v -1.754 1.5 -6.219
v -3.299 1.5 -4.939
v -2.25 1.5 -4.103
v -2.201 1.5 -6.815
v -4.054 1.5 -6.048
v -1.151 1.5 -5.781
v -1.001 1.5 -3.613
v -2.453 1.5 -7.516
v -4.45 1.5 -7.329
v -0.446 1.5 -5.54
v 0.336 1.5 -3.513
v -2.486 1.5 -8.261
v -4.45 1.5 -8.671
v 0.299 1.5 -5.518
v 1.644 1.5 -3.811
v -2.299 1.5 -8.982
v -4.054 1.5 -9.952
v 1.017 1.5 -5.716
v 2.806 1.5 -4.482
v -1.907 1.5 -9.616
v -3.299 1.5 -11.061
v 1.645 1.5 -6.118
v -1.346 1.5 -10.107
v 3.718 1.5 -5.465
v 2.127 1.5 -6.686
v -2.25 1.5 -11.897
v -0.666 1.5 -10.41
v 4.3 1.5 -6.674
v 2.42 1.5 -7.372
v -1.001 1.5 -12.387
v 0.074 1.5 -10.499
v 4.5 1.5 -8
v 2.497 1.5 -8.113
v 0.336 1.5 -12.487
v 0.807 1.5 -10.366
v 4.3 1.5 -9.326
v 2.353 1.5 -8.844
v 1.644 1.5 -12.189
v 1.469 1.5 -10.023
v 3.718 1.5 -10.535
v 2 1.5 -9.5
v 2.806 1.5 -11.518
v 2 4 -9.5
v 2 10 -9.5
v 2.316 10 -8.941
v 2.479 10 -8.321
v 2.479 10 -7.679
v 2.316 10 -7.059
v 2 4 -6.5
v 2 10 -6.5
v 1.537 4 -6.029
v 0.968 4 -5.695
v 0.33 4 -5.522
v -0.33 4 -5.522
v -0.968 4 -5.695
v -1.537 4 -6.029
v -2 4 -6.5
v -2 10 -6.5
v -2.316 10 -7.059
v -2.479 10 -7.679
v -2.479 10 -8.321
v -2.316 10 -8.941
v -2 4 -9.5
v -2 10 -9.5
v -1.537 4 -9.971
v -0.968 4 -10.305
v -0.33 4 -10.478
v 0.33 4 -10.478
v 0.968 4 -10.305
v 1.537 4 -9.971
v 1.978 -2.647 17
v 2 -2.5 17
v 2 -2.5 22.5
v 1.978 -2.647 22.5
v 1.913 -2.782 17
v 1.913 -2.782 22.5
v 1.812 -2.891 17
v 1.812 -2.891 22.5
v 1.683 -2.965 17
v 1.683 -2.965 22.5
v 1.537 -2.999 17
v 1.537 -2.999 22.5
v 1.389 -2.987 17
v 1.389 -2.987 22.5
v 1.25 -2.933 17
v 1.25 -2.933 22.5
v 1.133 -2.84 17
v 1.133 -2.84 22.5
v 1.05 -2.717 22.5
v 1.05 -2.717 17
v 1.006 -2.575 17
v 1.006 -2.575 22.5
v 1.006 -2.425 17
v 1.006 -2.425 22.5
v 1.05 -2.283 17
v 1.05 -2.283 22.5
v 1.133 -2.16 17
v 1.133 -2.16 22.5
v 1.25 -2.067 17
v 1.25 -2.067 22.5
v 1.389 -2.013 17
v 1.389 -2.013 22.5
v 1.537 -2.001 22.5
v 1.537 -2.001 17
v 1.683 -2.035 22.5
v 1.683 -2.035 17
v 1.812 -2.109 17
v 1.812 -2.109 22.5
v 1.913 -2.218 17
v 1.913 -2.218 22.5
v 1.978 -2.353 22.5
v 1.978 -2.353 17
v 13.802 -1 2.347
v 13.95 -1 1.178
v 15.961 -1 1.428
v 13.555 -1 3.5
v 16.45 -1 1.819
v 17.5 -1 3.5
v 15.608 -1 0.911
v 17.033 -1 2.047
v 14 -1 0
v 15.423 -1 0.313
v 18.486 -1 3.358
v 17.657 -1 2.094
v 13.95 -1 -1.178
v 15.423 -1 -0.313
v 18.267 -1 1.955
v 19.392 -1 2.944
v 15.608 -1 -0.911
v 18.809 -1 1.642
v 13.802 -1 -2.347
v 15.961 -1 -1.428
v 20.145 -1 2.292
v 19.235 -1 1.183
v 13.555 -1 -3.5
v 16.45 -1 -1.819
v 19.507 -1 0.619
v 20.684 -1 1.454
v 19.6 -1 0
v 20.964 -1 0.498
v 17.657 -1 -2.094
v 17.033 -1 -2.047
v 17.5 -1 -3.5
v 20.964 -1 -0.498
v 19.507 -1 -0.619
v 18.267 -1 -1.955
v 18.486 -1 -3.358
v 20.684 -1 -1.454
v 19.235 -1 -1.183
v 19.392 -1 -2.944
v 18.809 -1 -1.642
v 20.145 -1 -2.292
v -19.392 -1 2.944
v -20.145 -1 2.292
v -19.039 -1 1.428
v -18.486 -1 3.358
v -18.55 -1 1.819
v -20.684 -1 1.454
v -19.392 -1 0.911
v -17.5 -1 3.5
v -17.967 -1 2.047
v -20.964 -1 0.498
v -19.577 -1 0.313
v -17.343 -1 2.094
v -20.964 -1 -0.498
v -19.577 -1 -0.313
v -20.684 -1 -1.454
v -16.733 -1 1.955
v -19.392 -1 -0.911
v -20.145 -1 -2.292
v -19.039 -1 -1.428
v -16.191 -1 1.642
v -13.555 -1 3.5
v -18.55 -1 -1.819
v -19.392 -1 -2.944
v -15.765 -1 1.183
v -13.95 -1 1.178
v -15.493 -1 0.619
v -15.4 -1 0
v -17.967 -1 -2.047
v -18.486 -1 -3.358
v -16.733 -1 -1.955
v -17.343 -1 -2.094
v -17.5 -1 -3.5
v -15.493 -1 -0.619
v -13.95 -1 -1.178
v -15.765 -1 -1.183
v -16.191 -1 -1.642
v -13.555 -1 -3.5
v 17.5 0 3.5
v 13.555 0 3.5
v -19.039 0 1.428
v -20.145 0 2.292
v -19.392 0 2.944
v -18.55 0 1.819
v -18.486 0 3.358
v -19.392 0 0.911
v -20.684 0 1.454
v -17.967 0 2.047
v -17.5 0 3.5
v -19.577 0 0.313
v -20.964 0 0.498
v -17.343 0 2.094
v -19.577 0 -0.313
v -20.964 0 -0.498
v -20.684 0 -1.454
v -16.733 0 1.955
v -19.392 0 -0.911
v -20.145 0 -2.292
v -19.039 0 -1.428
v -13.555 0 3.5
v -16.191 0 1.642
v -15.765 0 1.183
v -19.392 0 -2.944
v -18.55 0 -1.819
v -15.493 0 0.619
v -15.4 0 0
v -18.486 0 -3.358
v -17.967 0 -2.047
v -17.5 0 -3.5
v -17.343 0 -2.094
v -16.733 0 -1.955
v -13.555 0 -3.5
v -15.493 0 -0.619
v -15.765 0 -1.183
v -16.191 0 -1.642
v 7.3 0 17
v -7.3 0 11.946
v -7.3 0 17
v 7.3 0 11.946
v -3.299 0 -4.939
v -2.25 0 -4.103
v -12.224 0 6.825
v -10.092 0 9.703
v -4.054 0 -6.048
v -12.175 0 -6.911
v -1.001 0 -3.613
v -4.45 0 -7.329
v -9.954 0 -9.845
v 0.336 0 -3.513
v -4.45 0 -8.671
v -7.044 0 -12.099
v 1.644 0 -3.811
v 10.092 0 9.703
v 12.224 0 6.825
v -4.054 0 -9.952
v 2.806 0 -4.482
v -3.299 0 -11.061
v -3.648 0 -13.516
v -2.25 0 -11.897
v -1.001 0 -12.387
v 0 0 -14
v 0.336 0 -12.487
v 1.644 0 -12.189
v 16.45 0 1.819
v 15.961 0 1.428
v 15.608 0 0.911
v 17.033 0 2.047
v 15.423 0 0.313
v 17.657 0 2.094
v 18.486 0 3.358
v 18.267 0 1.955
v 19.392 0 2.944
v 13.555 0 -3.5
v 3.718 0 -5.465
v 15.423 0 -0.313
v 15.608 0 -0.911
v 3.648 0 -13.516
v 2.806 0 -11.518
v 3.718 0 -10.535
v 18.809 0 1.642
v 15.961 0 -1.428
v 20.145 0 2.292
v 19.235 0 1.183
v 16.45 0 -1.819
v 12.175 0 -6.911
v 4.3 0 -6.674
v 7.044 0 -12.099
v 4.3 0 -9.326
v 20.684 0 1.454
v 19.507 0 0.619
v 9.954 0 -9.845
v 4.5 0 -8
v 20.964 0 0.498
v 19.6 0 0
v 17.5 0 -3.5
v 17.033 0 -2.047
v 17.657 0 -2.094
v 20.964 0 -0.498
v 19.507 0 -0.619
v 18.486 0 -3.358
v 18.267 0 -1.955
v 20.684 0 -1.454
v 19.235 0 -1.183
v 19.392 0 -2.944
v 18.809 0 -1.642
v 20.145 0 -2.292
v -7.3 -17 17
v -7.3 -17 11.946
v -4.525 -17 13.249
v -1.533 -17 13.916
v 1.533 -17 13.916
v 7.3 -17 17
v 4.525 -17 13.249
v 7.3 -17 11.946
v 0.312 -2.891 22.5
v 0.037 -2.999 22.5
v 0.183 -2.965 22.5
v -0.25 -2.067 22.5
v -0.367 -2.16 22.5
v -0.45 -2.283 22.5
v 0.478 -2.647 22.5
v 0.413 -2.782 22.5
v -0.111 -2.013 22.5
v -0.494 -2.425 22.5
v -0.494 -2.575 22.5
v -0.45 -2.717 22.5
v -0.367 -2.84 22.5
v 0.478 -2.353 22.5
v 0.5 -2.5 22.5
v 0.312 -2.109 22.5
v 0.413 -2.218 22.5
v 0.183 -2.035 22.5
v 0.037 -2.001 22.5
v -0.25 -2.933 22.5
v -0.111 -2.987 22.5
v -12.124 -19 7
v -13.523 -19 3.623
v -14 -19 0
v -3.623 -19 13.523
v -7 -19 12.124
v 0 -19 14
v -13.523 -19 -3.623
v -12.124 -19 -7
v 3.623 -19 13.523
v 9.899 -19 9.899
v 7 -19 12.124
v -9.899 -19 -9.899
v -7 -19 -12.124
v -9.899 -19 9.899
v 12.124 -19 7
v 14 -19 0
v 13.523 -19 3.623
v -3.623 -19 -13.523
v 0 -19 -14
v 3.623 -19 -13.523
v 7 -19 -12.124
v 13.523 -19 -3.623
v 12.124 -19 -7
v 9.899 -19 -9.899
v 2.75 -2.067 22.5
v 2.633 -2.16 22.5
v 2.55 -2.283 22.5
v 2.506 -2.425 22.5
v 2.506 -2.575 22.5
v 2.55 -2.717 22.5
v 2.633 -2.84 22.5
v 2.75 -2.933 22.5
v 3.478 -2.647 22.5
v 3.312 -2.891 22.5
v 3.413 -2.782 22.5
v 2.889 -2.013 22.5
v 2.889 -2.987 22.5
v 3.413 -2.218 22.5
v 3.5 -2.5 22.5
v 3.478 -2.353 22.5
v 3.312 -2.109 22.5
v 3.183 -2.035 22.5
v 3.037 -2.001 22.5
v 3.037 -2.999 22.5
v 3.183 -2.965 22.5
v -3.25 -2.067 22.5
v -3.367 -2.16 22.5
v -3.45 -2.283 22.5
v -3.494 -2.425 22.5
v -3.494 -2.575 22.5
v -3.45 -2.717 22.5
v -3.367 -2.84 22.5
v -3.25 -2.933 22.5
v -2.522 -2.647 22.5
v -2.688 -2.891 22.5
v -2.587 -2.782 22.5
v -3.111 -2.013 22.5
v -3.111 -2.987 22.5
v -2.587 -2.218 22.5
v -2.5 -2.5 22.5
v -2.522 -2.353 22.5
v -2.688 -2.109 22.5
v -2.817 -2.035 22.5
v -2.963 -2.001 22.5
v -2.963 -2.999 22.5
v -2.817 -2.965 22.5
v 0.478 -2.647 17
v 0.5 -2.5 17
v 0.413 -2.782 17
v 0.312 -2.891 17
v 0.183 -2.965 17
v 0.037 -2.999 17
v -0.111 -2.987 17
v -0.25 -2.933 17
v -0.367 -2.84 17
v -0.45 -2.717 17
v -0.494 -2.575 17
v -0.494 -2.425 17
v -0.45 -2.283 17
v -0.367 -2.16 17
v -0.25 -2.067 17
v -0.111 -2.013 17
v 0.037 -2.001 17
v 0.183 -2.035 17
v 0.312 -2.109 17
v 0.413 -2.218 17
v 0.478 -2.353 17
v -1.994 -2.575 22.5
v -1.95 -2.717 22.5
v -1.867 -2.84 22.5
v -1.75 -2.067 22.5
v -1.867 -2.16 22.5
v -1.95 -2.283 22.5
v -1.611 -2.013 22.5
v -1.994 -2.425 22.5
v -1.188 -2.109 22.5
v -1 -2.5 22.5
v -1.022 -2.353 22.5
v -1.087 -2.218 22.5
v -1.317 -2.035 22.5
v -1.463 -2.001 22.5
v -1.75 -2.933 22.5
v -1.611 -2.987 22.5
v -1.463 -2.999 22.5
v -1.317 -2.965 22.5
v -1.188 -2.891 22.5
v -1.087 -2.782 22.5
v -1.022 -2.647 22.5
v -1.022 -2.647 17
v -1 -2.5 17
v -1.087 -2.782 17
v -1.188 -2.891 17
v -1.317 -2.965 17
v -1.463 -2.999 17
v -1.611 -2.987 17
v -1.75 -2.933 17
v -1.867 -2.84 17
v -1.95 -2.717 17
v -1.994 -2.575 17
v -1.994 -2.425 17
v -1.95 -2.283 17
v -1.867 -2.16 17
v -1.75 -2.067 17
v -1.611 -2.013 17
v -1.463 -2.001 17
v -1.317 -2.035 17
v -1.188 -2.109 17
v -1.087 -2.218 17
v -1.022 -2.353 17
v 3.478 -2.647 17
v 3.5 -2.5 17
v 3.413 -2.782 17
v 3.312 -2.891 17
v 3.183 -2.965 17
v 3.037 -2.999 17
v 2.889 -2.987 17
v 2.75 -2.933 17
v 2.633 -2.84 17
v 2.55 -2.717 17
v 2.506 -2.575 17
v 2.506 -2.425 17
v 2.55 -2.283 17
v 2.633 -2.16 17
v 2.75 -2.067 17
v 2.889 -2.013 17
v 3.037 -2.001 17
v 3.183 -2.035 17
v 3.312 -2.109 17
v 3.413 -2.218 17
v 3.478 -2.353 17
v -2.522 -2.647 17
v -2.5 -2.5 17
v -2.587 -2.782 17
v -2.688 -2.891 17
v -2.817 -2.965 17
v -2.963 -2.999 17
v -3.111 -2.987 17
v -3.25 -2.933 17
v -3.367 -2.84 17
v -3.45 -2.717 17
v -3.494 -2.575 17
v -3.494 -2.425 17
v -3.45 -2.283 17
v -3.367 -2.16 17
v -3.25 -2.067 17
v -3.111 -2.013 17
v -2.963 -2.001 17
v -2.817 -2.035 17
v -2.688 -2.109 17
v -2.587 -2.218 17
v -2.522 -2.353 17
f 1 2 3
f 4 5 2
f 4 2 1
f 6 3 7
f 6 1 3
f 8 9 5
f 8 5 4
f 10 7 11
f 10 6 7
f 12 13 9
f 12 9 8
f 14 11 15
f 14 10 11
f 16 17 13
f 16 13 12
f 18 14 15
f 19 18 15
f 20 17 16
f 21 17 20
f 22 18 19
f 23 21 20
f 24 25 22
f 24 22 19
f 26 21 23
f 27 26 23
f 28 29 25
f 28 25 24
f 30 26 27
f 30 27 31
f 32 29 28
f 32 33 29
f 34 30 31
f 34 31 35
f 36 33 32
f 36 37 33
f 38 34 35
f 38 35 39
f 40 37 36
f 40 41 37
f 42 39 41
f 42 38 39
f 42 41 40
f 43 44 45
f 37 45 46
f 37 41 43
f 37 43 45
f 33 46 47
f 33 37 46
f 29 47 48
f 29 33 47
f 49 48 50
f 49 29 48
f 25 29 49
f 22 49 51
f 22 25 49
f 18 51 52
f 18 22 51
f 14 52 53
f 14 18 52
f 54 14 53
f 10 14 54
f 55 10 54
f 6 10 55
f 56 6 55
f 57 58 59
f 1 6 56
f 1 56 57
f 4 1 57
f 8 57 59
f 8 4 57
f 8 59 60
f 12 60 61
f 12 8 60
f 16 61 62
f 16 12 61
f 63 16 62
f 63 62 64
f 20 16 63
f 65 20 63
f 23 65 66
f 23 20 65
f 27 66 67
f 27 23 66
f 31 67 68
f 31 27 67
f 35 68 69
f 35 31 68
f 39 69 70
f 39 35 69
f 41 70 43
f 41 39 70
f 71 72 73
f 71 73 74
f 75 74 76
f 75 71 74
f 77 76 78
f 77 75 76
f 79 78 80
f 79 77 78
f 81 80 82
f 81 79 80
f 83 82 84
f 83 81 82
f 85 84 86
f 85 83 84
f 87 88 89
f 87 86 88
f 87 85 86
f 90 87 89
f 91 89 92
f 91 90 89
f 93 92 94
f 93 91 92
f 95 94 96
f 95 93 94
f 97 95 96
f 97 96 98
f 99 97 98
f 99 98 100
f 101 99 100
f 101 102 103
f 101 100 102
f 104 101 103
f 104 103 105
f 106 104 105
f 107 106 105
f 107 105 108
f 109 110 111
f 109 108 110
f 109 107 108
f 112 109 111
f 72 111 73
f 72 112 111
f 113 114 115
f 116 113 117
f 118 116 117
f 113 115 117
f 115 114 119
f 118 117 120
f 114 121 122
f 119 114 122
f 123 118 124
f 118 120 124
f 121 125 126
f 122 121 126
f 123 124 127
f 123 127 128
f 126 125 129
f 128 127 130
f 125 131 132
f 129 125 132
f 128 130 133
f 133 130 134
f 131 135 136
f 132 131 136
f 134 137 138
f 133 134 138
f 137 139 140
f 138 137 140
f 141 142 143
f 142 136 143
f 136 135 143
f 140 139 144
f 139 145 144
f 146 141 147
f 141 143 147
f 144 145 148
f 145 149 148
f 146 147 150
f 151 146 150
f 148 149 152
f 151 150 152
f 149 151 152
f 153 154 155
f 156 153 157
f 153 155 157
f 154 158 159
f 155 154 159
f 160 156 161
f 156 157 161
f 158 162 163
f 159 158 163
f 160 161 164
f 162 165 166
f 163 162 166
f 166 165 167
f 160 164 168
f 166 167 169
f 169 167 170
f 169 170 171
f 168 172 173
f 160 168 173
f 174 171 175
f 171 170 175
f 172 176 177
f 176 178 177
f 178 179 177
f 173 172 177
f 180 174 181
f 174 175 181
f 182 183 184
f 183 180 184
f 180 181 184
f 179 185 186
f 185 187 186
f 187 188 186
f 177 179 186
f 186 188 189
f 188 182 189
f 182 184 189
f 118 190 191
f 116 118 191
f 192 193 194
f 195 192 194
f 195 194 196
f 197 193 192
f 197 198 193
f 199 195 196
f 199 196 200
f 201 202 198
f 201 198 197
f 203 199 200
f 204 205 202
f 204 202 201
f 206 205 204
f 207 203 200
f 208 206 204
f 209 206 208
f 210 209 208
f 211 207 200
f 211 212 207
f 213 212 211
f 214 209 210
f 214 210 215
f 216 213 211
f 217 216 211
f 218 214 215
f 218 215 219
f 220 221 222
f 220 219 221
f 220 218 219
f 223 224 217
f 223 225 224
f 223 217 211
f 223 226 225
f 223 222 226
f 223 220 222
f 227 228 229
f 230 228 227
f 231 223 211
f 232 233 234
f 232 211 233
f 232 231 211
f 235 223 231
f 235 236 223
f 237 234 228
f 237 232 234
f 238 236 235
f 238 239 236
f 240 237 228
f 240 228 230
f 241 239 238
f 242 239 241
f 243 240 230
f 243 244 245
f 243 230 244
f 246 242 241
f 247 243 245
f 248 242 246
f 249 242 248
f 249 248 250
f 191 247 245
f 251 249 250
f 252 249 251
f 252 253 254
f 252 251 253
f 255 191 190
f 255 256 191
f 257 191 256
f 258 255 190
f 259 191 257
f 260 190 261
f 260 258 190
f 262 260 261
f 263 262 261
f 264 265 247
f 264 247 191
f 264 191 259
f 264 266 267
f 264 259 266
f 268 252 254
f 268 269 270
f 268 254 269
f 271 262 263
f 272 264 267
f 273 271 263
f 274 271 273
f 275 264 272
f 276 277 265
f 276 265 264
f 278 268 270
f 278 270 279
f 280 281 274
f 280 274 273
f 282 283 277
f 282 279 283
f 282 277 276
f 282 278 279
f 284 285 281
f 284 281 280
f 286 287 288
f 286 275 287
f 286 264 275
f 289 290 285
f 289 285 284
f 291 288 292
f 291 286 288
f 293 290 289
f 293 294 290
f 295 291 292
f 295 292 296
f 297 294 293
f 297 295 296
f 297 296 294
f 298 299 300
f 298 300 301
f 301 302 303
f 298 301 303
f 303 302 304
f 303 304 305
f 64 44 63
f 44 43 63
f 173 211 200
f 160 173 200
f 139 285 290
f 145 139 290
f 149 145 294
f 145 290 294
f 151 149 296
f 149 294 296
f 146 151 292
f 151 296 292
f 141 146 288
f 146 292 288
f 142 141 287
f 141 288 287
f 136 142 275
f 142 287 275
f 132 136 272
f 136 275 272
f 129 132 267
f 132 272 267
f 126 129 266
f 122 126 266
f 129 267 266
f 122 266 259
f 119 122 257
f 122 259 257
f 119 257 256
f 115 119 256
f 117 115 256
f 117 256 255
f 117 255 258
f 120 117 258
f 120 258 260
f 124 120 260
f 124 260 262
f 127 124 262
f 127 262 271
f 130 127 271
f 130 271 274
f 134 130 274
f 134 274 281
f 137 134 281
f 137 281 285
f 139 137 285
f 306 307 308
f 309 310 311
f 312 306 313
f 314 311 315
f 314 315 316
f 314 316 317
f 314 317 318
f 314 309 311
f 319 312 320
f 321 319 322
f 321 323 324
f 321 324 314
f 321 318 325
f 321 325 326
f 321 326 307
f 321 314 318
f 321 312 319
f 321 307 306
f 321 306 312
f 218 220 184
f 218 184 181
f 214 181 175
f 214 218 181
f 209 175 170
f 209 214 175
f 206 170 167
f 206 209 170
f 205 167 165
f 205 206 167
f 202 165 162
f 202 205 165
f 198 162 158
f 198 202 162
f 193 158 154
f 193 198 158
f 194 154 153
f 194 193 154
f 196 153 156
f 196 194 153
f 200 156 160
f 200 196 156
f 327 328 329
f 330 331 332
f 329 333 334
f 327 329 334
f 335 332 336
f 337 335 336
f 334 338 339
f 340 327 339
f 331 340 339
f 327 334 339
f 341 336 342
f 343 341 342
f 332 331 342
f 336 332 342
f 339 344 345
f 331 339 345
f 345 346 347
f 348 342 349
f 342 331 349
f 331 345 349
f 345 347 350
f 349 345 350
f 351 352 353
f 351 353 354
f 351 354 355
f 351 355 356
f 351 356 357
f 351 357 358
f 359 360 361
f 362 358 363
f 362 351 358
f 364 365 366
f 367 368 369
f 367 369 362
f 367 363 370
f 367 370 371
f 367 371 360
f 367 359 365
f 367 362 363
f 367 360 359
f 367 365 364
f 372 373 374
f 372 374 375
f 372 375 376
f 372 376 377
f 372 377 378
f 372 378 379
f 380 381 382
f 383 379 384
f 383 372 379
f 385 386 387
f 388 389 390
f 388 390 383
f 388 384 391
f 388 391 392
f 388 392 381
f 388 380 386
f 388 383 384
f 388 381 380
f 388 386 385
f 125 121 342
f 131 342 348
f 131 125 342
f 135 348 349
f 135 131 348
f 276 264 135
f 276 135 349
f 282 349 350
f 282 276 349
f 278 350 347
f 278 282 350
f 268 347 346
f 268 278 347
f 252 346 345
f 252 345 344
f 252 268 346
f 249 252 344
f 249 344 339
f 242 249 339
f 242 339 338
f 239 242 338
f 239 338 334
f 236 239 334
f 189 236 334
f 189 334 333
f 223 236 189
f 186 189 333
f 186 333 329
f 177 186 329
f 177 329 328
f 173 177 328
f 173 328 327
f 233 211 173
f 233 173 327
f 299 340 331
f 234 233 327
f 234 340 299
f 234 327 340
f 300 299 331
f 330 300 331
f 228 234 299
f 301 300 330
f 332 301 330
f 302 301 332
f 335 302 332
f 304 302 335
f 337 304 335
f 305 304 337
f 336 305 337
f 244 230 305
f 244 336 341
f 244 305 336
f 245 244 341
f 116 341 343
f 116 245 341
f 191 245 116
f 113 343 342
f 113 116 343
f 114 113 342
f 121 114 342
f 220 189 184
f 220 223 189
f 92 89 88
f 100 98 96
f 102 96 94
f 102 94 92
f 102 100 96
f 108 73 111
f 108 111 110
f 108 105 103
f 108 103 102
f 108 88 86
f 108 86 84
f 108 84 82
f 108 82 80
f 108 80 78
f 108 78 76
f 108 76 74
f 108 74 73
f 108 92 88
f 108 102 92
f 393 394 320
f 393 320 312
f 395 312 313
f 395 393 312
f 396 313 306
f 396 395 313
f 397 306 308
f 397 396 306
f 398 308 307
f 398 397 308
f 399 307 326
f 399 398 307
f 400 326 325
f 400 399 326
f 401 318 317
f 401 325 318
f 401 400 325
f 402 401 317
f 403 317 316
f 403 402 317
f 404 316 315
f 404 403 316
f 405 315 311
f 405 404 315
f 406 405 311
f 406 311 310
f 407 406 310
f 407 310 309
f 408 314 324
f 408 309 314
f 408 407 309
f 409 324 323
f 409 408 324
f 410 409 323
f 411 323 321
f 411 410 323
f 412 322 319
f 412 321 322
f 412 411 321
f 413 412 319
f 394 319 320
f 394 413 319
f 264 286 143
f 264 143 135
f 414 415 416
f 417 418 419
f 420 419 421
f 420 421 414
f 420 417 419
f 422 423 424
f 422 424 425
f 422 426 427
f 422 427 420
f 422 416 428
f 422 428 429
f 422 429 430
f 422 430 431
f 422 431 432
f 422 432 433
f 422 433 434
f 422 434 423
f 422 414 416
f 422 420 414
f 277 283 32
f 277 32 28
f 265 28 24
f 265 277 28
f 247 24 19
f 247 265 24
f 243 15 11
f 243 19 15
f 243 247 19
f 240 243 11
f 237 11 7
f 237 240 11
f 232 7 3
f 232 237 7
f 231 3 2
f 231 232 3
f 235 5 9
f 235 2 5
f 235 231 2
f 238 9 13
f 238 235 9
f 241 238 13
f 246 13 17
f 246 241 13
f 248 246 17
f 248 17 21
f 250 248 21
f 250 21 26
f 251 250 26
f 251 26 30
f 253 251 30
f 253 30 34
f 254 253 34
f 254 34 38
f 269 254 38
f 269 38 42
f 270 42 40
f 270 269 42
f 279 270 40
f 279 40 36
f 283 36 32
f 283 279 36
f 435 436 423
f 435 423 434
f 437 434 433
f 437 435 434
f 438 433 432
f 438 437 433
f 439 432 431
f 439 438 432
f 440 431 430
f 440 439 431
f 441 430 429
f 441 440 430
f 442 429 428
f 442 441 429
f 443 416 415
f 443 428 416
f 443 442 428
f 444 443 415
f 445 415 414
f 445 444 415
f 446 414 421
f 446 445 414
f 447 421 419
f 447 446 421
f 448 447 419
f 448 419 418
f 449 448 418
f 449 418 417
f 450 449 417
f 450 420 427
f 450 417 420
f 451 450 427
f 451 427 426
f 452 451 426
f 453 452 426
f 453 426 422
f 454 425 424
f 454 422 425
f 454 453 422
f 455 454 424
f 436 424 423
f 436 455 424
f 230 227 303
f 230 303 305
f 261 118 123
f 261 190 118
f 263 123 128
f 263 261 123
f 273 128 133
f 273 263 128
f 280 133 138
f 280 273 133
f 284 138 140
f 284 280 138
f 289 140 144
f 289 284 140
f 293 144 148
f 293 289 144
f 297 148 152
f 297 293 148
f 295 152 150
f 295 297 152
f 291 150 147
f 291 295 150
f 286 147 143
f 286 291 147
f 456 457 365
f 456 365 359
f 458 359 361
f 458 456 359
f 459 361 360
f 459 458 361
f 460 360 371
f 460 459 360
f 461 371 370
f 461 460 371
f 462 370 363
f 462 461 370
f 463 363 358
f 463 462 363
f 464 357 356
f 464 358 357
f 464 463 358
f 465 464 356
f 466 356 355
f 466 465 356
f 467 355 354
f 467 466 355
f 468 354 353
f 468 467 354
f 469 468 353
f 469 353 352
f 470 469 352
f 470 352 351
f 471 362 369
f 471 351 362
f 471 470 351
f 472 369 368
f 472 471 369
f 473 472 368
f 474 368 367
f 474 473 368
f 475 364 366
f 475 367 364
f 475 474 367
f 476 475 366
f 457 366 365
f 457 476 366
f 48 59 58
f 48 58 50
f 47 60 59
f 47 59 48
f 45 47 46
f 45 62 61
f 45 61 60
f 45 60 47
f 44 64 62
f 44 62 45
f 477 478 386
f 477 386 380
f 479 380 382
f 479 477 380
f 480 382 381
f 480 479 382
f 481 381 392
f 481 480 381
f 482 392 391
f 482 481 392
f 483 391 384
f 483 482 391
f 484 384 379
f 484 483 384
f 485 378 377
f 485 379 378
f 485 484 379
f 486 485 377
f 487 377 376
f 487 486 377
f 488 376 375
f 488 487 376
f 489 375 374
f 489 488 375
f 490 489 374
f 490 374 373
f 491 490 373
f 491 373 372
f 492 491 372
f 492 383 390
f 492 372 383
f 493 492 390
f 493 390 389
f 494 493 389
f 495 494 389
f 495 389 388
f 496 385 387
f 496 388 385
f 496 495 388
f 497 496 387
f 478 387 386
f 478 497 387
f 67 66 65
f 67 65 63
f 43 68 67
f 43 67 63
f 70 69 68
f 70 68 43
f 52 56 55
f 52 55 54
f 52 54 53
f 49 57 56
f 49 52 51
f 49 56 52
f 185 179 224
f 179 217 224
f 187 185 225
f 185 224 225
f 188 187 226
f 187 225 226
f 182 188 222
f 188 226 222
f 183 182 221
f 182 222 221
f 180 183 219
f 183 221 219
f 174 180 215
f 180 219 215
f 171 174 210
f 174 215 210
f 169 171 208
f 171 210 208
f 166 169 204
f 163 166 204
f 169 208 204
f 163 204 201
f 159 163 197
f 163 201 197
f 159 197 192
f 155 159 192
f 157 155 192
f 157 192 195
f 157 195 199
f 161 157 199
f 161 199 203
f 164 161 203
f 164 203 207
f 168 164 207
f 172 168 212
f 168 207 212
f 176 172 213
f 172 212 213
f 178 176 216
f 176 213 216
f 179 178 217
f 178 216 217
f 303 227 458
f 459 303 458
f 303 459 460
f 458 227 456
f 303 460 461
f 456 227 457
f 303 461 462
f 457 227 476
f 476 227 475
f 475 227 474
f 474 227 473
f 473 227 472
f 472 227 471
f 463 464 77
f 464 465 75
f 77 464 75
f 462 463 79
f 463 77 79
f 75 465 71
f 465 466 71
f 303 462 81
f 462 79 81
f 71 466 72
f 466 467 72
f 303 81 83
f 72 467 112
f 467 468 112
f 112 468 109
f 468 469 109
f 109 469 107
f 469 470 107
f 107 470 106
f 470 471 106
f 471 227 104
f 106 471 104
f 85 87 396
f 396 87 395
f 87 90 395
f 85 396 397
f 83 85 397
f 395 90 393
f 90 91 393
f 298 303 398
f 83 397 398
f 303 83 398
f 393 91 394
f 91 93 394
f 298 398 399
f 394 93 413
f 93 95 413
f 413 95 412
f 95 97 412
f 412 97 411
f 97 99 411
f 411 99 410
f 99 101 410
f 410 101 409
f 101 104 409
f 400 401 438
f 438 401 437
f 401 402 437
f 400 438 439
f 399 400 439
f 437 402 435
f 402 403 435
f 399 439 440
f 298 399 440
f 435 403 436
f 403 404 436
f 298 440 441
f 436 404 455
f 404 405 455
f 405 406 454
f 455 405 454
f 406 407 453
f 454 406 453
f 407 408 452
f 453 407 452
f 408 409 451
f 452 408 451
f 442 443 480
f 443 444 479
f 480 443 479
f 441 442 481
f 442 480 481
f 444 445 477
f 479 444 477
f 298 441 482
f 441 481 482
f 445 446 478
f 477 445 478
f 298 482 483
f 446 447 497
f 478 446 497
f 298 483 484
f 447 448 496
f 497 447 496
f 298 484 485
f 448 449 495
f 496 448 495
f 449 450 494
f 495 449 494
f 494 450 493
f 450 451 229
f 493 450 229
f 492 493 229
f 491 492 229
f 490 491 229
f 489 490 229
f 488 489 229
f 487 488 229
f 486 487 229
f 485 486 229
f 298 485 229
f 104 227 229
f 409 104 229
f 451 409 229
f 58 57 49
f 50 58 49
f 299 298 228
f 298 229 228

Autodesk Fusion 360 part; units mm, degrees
sketch "Skizze1" plane through (0, 0, 0) normal (0, 1, 0) x (1, 0, 0)
  circle A0 centre (0, 0) radius 14
  circle A1 centre (17.5, 0) radius 2.1
  circle A2 centre (-17.5, 0) radius 2.1
  circle A3 centre (0, 8) radius 4.5
  circle A4 centre (0, 8) radius 2.5
  line L0 (2, 9.5) -> (-2, 9.5)
  line L1 (-2, 6.5) -> (2, 6.5)
  line L2 (0, 0) -> (0, 14) construction
  line L3 (0, 0) -> (0, -17) construction
  line L4 (0, -17) -> (7.3, -17)
  line L5 (0, -17) -> (-7.3, -17)
  line L6 (-7.3, -17) -> (-7.3, -11.9461)
  line L7 (7.3, -17) -> (7.3, -11.9461)
  line L8 (0, 0) -> (-17.5, 0) construction
  line L9 (0, 0) -> (17.5, 0) construction
  line L10 (17.5, 0) -> (17.5, 3.5) construction
  line L11 (17.5, 0) -> (17.5, -3.5) construction
  line L12 (17.5, 3.5) -> (13.5554, 3.5)
  line L13 (-13.5554, 3.5) -> (-17.5, 3.5)
  arc A5 (-17.5, 3.5) -> (-17.5, -3.5) centre (-17.5, 0) ccw
  line L14 (17.5, -3.5) -> (13.5554, -3.5)
  line L15 (-13.5554, -3.5) -> (-17.5, -3.5)
  arc A6 (17.5, -3.5) -> (17.5, 3.5) centre (17.5, 0) ccw
  dimension "d1" = 28
  dimension "d2" = 4.2
  dimension "d3" = 4.2
  dimension "d4" = 17.5
  dimension "d5" = 17.5
  dimension "d6" = 9
  dimension "d7" = 8
  dimension "d8" = 5
  dimension "d9" = 3
  dimension "d10" = 17
  dimension "d11" = 7.3
  dimension "d12" = 7.3
  dimension "d13" = 7
  dimension "d14" = 7
extrude "Extrusion1" add sketch "Skizze1" against normal blind 19 contours A0 | A3 | A4 L0 L1 | A4 L0 | A4 L1
extrude "Extrusion2" add sketch "Skizze1" against normal blind 17 contours A0 L4 L5 L6 L7
extrude "Extrusion3" add sketch "Skizze1" against normal blind 1 contours A0 L12 L14 A6 | A0 L13 A5 L15
extrude "Extrusion4" add sketch "Skizze1" along normal blind 1.5 contours A3
extrude "Extrusion5" add sketch "Skizze1" along normal blind 10 contours A4 L0 L1
extrude "Extrusion6" add sketch "Skizze1" along normal blind 4 contours A4 L0 | A4 L1
sketch "Skizze2" plane through (0, 0, 17) normal (0, 0, 1) x (1, 0, 0)
  line L0 (7.3, 0) -> (-7.3, 0)
  line L1 (-7.3, 0) -> (-7.3, -17)
  line L2 (-7.3, -17) -> (7.3, -17)
  line L3 (7.3, -17) -> (7.3, 0)
  circle A0 centre (0, -2.5) radius 0.5
  circle A1 centre (-1.5, -2.5) radius 0.5
  circle A2 centre (-3, -2.5) radius 0.5
  circle A3 centre (1.5, -2.5) radius 0.5
  circle A4 centre (3, -2.5) radius 0.5
extrude "Extrusion7" add sketch "Skizze2" along normal blind 5.5 contours A0 | A1 | A2 | A3 | A4
equation "d25 = 10.00 mm - 6 mm"
